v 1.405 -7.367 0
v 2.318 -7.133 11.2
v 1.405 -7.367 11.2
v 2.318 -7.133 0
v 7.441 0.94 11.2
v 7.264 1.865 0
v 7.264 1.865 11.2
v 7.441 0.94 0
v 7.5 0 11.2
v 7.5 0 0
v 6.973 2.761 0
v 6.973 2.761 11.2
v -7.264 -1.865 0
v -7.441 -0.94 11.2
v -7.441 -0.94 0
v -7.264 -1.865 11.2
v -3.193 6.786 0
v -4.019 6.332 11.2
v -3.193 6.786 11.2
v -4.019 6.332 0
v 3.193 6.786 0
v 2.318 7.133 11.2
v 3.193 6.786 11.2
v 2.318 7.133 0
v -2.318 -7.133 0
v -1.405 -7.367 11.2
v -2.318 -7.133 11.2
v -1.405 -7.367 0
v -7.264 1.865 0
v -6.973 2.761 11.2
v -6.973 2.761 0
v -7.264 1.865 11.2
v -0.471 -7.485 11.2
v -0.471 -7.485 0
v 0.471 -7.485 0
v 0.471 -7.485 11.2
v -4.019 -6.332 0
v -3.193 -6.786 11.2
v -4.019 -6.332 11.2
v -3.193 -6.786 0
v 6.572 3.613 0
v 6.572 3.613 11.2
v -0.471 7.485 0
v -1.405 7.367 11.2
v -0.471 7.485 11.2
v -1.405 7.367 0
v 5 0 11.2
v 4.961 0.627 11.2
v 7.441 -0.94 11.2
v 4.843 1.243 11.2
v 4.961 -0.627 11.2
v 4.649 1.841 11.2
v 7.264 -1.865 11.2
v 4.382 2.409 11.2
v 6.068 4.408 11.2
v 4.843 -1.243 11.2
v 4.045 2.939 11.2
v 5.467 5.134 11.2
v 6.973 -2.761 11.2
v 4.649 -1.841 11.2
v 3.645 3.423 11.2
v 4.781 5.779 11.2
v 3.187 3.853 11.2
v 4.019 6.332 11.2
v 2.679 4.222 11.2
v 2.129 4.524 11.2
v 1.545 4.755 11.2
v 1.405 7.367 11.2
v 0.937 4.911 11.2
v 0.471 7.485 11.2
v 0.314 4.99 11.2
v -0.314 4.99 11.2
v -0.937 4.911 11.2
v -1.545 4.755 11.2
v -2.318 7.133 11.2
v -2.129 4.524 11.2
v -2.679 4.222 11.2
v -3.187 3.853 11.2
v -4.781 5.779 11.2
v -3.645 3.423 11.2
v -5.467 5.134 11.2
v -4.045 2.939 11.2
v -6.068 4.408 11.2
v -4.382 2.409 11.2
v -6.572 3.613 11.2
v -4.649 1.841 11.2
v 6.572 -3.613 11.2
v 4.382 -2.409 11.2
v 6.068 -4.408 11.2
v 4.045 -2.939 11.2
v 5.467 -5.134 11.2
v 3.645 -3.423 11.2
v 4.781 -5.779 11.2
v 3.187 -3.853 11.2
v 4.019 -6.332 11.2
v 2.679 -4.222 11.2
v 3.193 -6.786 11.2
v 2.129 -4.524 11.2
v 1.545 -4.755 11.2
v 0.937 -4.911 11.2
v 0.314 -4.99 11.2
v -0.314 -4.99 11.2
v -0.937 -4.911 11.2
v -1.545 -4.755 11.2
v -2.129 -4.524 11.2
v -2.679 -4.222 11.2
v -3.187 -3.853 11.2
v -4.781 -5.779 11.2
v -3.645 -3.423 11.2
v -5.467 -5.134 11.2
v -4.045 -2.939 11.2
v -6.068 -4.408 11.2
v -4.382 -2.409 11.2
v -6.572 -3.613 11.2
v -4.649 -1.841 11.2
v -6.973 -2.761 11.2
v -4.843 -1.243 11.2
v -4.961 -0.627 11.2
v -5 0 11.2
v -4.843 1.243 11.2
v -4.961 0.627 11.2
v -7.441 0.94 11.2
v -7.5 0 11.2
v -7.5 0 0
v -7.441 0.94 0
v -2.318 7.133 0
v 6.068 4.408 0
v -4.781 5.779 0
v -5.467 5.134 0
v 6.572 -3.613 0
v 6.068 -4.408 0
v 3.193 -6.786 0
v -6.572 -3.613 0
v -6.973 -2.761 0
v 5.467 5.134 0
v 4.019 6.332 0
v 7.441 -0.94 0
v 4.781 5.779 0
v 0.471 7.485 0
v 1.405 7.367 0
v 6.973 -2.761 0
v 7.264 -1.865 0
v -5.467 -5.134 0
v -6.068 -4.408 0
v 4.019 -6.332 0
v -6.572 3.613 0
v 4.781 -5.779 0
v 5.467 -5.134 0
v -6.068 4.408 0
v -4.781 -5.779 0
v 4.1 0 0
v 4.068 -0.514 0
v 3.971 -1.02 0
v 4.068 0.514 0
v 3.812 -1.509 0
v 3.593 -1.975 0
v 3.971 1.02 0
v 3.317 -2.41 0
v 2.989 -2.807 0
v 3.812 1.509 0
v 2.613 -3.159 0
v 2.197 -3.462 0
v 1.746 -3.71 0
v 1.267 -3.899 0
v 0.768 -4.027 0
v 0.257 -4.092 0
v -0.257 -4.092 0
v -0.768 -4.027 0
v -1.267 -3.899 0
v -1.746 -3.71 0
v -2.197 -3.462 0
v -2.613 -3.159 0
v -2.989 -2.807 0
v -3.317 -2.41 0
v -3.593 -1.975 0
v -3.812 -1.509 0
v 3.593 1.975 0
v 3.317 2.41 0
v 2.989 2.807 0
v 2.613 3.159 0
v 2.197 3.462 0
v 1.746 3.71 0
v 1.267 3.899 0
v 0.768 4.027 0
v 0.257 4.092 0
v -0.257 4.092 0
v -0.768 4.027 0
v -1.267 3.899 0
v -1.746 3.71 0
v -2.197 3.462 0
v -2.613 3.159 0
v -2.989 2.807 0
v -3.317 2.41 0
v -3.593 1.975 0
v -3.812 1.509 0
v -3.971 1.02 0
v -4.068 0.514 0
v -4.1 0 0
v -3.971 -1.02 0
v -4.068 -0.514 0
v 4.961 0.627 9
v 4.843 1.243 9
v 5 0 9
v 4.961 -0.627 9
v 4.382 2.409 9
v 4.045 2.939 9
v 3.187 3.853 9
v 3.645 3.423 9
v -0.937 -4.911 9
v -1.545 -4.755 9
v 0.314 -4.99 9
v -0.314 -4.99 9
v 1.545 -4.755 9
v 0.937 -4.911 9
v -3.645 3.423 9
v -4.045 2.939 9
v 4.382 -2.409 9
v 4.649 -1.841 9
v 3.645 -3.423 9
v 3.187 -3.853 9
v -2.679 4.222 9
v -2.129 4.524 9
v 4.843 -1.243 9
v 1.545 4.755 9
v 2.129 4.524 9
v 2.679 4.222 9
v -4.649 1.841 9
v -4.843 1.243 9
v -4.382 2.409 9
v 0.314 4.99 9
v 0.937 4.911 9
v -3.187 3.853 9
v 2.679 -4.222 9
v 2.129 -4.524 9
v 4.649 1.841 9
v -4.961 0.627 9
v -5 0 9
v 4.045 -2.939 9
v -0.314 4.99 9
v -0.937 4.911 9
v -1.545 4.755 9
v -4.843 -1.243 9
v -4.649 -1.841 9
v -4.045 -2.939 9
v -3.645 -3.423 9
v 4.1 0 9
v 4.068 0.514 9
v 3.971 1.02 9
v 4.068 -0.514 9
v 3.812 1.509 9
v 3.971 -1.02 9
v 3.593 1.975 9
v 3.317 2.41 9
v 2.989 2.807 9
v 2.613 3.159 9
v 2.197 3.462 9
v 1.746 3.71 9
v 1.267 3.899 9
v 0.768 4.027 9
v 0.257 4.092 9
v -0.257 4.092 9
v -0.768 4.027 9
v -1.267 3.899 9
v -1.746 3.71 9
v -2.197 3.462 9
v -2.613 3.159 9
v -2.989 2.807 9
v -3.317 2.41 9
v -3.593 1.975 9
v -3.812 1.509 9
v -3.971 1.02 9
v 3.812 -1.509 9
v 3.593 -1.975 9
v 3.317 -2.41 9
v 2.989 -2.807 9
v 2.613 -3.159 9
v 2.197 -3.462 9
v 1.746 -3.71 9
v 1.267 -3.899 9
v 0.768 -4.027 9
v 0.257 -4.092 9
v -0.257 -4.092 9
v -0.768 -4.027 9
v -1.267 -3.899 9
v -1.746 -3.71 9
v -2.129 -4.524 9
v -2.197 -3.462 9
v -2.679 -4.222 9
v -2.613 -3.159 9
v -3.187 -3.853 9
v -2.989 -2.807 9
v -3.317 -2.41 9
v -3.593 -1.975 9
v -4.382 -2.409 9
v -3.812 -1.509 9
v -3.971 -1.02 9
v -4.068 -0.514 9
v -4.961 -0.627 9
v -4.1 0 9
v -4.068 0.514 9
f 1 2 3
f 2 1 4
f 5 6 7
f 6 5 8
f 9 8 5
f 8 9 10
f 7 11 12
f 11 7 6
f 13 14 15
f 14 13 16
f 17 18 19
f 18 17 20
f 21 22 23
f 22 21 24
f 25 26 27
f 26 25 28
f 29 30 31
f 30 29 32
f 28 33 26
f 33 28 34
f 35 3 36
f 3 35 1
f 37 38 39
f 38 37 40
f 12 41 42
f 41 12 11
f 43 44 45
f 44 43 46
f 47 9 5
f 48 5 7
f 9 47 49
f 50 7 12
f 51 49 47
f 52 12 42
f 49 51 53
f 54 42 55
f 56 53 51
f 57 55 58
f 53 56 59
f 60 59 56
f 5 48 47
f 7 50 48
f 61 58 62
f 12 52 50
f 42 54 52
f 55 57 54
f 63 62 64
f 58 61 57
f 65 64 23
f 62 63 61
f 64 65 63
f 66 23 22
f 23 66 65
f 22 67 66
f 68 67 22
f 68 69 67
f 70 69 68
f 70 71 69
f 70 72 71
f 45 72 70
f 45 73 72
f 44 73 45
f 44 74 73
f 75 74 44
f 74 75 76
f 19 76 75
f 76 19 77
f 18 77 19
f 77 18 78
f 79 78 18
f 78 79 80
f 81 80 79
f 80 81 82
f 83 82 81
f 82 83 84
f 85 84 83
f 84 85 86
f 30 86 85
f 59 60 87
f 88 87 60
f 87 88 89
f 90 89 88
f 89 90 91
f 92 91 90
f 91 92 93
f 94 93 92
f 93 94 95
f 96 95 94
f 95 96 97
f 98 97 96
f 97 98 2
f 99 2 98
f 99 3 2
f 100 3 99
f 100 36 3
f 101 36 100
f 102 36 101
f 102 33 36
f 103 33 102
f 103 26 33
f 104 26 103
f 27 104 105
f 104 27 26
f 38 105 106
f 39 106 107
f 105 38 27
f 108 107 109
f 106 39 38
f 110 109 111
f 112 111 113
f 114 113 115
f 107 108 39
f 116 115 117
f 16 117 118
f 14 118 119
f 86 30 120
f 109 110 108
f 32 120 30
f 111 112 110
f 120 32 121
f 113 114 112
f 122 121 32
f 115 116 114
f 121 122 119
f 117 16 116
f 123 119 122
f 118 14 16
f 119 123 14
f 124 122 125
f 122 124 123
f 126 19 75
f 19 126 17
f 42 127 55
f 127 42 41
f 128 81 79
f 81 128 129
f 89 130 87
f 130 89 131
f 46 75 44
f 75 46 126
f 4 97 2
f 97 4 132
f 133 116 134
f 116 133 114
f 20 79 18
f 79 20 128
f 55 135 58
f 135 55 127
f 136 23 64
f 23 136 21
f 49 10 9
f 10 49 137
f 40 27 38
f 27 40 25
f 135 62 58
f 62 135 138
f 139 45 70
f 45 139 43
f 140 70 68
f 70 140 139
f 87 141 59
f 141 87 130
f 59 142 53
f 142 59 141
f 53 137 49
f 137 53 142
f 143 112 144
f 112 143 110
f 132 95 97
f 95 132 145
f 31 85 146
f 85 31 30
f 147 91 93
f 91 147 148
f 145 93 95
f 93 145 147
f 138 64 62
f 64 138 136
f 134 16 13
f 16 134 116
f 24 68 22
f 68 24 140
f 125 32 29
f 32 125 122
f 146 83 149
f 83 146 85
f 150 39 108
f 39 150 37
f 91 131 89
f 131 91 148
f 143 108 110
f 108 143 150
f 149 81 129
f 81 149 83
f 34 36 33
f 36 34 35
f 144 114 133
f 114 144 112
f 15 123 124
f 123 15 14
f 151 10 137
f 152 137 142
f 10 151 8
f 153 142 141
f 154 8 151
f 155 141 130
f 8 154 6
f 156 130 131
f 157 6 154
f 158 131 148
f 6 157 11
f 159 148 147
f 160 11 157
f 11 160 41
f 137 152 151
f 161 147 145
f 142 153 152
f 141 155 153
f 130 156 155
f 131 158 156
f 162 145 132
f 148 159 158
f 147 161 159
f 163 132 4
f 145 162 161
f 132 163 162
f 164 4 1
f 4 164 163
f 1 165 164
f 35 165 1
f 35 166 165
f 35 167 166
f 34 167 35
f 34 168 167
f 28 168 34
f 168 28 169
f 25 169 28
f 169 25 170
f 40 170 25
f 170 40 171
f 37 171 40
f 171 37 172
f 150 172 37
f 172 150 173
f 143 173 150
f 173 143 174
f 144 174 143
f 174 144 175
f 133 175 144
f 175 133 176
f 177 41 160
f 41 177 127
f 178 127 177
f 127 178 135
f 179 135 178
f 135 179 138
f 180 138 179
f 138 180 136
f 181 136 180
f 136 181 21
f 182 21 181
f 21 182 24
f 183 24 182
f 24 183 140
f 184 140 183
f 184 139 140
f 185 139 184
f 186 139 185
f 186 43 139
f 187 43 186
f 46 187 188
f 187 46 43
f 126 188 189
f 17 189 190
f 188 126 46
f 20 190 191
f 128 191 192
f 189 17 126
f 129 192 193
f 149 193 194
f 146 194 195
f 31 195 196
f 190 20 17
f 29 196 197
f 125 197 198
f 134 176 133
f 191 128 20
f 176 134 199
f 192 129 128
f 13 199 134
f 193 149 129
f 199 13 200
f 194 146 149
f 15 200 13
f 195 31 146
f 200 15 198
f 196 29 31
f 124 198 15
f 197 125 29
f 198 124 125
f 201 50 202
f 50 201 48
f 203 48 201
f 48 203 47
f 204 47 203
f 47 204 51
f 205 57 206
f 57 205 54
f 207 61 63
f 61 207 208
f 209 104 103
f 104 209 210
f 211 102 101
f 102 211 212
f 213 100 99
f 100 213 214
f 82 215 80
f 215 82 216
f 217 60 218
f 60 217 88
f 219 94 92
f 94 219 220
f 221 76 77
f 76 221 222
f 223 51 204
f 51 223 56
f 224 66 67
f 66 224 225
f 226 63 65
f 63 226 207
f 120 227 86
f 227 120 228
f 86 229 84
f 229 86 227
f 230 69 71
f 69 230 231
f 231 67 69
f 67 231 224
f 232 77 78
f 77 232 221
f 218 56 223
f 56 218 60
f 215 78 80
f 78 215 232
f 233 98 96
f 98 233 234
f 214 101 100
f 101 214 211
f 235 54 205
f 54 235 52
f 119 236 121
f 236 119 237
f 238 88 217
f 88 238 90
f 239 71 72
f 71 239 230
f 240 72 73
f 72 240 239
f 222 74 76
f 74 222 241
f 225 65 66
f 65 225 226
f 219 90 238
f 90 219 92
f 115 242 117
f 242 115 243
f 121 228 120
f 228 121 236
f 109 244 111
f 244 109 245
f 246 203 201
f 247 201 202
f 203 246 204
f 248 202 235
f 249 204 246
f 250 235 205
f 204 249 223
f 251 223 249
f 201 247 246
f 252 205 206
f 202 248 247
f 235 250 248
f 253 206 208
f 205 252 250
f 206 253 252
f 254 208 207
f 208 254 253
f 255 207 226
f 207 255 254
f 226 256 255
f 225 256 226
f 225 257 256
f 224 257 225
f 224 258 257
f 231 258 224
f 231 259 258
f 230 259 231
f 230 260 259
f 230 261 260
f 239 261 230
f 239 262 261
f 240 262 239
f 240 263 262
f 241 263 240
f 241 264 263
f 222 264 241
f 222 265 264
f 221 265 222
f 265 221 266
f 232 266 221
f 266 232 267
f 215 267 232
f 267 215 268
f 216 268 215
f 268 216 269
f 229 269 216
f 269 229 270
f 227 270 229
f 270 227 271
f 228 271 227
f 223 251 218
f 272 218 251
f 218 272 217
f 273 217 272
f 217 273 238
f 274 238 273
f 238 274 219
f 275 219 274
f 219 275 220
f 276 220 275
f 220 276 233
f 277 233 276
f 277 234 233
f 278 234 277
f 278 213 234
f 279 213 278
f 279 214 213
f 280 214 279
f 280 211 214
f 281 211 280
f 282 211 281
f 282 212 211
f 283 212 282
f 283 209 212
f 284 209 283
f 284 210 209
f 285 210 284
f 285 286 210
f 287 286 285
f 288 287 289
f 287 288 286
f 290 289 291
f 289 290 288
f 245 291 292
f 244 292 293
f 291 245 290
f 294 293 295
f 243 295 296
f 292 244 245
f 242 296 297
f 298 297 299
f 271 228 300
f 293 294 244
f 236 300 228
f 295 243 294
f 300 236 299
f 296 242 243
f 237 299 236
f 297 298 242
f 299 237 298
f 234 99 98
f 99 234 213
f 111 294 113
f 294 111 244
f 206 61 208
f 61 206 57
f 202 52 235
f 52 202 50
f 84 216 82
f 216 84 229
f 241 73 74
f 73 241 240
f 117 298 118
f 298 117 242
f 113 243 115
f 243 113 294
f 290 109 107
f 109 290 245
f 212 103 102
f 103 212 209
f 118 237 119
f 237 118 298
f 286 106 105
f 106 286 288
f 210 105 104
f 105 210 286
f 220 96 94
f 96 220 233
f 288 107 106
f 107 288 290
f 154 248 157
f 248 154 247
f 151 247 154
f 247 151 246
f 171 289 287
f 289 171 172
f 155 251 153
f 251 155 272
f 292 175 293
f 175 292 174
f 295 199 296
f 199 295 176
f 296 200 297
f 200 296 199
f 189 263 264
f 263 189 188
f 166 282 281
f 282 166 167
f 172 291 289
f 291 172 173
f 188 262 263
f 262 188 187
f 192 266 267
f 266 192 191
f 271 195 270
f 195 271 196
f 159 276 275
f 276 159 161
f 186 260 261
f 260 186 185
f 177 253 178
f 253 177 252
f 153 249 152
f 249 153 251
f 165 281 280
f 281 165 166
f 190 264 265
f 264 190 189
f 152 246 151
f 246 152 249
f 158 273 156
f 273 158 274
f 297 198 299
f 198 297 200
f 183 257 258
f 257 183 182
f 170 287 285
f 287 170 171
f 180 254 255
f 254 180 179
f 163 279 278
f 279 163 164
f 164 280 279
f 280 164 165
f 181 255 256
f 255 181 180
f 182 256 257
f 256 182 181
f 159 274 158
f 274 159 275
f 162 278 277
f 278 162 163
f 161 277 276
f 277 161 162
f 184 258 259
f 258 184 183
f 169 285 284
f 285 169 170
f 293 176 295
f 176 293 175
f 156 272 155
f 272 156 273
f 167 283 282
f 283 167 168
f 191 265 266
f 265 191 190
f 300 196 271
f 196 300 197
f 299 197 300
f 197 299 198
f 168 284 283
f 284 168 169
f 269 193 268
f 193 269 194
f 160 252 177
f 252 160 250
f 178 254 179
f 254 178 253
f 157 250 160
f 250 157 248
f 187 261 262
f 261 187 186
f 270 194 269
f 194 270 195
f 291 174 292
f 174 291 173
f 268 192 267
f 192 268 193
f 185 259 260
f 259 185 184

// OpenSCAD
// magnet 10x3 holder on 6mm axis with thread

$fn=50;
ov = 0.1; // overshot for clear view

r_mag    = 5.0;
h_mag    = 2.2;
r_axis   = 4.1; // 
h_axis   = 9.0;
r_out = max(r_mag,r_axis) + 2.5;
h_all = h_mag + h_axis;

difference() {
  cylinder( h=h_all, r=r_out );
  translate([0,0,h_axis]) cylinder( h=h_mag+ov, r=r_mag );
  translate([0,0,-ov]) cylinder( h=h_all+2-ov, r=r_axis );
}
